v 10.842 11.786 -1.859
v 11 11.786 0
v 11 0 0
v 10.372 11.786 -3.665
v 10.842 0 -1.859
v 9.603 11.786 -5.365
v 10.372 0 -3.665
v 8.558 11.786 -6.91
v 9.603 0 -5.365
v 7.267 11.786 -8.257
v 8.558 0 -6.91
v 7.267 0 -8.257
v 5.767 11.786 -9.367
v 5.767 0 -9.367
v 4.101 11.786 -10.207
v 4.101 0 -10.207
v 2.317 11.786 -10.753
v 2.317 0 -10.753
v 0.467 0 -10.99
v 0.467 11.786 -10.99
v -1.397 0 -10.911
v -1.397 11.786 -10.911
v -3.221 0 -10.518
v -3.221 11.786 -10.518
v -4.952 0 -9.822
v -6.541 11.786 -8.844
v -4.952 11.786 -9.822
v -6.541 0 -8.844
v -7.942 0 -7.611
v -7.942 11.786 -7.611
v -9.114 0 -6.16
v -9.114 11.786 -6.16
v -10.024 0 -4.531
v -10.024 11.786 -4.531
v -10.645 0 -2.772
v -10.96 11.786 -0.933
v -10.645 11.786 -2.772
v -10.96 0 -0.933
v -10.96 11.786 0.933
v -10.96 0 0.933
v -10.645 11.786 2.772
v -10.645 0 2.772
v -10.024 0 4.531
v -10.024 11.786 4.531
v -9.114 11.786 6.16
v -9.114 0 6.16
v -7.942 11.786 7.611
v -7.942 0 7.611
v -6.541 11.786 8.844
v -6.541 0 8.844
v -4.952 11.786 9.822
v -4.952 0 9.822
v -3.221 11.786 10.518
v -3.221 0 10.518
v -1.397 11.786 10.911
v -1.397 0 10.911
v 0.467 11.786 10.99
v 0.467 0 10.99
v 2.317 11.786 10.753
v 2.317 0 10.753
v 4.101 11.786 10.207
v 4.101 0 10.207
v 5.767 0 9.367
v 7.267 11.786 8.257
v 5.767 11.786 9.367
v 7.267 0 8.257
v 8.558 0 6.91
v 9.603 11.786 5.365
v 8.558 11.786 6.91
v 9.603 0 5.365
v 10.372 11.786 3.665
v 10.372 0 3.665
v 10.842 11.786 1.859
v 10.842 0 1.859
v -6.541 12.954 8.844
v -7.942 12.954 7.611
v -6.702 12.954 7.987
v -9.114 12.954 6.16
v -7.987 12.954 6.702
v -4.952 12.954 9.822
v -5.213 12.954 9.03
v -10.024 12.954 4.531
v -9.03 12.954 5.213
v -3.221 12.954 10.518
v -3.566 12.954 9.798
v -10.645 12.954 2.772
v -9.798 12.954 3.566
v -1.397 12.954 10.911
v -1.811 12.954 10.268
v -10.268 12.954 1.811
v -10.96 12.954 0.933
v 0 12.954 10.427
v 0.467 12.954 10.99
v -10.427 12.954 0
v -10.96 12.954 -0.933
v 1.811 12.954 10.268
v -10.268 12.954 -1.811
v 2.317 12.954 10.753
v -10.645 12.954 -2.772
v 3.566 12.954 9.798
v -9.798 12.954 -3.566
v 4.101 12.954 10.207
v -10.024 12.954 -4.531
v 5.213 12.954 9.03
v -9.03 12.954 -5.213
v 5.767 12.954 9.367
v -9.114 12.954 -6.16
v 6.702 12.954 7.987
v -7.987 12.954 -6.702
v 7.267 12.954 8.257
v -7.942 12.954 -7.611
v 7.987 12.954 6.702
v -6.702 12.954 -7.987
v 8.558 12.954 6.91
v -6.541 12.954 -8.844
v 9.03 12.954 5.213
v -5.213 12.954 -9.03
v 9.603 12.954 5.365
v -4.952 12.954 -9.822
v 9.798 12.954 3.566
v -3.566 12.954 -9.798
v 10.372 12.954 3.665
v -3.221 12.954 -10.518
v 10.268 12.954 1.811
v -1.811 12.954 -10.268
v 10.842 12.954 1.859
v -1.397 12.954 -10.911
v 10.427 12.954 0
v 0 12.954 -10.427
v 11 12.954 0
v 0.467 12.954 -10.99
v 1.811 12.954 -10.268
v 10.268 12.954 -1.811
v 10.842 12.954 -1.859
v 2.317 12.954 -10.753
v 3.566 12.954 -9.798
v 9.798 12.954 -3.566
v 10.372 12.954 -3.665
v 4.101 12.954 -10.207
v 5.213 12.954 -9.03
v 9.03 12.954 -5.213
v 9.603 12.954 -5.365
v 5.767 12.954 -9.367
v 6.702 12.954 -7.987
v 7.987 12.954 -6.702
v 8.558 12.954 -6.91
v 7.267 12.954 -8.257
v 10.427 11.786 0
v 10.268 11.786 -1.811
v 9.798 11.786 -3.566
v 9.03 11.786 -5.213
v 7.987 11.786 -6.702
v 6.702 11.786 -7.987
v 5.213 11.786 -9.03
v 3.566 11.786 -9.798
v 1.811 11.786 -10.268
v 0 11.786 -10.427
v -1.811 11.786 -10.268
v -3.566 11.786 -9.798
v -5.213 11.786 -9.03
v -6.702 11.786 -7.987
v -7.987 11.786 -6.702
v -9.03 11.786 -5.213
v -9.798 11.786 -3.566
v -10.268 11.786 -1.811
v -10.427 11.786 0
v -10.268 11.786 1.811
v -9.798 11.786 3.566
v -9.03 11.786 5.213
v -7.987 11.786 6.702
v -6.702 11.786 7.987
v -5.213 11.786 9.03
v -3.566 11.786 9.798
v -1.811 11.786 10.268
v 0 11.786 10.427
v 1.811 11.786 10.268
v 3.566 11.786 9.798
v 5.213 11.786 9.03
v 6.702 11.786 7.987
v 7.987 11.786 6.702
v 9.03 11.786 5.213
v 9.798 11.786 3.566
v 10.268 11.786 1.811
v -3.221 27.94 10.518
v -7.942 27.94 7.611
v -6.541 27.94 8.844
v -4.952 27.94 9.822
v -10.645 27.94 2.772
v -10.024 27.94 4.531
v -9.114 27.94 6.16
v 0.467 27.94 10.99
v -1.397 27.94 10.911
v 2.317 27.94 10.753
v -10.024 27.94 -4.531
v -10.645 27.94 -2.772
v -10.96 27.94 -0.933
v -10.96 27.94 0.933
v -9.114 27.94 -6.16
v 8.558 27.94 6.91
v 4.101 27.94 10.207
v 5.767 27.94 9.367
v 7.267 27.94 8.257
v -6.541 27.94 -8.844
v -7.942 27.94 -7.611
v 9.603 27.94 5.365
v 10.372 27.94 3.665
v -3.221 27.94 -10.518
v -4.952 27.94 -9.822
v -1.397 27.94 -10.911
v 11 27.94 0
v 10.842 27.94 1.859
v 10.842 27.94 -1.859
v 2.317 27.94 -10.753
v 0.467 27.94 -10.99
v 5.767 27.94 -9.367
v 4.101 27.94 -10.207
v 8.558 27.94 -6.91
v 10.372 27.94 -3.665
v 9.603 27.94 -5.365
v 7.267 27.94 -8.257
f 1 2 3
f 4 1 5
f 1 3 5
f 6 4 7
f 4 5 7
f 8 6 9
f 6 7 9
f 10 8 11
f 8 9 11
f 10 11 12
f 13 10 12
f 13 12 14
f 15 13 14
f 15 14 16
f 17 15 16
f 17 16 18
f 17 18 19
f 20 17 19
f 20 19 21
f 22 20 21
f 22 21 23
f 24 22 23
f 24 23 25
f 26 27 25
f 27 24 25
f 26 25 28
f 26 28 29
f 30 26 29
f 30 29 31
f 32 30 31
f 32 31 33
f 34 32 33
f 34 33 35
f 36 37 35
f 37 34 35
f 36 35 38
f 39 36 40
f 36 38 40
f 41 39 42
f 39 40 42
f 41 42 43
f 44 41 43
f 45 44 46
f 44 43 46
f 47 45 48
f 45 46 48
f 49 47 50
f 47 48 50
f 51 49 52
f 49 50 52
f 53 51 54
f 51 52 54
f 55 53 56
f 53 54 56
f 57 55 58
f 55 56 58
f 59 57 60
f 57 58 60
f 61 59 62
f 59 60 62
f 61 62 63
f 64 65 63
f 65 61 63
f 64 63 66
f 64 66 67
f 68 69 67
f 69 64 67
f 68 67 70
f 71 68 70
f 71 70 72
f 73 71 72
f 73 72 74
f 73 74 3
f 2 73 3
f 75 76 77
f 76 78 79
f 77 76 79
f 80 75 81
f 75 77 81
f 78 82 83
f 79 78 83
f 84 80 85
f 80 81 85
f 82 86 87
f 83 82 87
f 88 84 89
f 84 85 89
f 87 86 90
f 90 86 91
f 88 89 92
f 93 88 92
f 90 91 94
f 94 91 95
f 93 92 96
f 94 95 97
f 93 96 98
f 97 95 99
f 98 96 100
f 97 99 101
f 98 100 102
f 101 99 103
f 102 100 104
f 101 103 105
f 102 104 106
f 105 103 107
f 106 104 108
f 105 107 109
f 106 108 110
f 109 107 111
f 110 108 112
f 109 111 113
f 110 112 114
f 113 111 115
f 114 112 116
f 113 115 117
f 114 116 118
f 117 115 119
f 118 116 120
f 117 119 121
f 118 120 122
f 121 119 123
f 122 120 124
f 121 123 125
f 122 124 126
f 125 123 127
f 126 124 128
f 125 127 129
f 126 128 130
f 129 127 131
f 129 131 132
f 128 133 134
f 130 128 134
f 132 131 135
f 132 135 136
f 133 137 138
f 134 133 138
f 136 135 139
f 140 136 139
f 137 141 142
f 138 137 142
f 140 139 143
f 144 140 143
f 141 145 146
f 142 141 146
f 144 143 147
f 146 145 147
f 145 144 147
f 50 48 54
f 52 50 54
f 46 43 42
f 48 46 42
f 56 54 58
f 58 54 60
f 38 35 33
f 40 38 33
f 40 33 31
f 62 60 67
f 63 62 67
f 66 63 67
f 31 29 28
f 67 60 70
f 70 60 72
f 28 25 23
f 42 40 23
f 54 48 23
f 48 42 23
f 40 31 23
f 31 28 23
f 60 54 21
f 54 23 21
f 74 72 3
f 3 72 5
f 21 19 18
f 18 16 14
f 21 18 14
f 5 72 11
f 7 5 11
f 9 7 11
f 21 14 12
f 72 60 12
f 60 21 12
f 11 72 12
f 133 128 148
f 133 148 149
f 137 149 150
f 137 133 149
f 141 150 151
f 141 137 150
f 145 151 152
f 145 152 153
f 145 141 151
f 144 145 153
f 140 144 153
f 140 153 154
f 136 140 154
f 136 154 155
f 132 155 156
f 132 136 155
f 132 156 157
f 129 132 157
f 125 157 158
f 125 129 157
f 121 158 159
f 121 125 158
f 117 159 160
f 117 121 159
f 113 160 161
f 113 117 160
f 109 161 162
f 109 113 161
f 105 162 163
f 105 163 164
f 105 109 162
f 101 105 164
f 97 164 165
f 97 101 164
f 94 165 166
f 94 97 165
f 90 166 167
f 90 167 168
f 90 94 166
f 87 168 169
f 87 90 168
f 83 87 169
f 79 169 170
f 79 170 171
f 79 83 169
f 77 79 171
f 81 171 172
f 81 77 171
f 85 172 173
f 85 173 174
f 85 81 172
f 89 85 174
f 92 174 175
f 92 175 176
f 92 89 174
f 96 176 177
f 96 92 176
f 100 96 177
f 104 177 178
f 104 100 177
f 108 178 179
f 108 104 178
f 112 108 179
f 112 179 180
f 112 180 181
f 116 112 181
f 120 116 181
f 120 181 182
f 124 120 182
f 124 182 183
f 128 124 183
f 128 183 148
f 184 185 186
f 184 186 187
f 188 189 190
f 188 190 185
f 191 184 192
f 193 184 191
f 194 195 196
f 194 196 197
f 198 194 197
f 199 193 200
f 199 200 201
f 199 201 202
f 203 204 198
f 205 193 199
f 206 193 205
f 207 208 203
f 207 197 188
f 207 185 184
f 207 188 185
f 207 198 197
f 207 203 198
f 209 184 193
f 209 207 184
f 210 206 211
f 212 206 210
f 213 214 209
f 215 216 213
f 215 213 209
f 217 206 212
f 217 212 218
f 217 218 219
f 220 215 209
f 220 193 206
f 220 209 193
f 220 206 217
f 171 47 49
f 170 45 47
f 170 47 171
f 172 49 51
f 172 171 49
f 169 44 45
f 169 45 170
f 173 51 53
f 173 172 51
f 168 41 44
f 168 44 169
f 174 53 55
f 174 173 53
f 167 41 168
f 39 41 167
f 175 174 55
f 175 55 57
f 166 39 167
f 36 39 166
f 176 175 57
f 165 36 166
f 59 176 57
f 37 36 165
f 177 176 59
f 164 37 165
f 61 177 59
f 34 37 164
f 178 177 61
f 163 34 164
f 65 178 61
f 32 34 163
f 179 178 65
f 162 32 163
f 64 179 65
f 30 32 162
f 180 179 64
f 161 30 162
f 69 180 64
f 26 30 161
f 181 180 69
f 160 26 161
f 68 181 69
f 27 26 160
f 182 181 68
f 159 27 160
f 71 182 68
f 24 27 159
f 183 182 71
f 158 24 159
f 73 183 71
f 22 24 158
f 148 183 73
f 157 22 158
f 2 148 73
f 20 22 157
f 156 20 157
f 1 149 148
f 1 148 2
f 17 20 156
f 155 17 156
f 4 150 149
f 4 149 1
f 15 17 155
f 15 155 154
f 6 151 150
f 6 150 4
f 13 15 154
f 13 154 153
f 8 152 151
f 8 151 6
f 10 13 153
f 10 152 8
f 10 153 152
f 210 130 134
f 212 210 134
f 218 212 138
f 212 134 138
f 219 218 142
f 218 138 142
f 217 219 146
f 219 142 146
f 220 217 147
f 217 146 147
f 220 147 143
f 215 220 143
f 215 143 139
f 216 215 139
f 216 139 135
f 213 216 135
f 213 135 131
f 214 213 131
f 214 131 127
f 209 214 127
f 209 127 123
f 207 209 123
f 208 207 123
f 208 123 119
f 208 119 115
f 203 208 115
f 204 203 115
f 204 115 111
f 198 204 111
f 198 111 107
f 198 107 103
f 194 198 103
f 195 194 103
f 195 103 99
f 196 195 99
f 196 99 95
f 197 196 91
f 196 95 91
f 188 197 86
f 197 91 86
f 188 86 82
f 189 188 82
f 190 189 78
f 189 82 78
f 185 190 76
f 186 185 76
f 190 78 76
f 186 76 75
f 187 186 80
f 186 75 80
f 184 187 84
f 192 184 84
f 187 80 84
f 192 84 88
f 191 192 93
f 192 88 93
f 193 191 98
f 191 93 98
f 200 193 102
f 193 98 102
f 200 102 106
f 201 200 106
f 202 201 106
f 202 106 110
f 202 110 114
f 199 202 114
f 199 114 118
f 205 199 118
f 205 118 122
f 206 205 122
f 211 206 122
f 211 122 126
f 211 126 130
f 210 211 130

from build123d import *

# Parameters (mm, degrees)
SKETCH1_R           = 11
BOSS_EXTRUDE1_DEPTH = 27.94
SKETCH2_R           = 10.4267
CUT_EXTRUDE1_DEPTH  = 1.1684


with BuildPart() as part:
    # Sketch1 → Boss-Extrude1 (new body)
    with BuildSketch(Plane(origin=(0, 0, 0), x_dir=(1, 0, 0), z_dir=(0, 1, 0))):
        Circle(SKETCH1_R)
    extrude(amount=BOSS_EXTRUDE1_DEPTH)

    # Sketch2 → Cut-Extrude1 (cut)
    with BuildSketch(Plane(origin=(0, 12.954, 0), x_dir=(1, 0, 0), z_dir=(0, 1, 0))):
        with BuildLine():
            Line((-17.239436612, 14.563425366), (-16.28375247, -14.840830381))
            Line((-16.28375247, -14.840830381), (21.406068048, -16.295664576))
            Line((21.406068048, -16.295664576), (22.094276354, 14.197317514))
            Line((22.094276354, 14.197317514), (19.887741586, 14.563425366))
            ThreePointArc((19.887741586, 14.563425366), (1.324152487, 14.86501853), (-17.239436612, 14.563425366))
        make_face()
        Circle(SKETCH2_R, mode=Mode.SUBTRACT)
    extrude(amount=-CUT_EXTRUDE1_DEPTH, mode=Mode.SUBTRACT)


solid = part.part
